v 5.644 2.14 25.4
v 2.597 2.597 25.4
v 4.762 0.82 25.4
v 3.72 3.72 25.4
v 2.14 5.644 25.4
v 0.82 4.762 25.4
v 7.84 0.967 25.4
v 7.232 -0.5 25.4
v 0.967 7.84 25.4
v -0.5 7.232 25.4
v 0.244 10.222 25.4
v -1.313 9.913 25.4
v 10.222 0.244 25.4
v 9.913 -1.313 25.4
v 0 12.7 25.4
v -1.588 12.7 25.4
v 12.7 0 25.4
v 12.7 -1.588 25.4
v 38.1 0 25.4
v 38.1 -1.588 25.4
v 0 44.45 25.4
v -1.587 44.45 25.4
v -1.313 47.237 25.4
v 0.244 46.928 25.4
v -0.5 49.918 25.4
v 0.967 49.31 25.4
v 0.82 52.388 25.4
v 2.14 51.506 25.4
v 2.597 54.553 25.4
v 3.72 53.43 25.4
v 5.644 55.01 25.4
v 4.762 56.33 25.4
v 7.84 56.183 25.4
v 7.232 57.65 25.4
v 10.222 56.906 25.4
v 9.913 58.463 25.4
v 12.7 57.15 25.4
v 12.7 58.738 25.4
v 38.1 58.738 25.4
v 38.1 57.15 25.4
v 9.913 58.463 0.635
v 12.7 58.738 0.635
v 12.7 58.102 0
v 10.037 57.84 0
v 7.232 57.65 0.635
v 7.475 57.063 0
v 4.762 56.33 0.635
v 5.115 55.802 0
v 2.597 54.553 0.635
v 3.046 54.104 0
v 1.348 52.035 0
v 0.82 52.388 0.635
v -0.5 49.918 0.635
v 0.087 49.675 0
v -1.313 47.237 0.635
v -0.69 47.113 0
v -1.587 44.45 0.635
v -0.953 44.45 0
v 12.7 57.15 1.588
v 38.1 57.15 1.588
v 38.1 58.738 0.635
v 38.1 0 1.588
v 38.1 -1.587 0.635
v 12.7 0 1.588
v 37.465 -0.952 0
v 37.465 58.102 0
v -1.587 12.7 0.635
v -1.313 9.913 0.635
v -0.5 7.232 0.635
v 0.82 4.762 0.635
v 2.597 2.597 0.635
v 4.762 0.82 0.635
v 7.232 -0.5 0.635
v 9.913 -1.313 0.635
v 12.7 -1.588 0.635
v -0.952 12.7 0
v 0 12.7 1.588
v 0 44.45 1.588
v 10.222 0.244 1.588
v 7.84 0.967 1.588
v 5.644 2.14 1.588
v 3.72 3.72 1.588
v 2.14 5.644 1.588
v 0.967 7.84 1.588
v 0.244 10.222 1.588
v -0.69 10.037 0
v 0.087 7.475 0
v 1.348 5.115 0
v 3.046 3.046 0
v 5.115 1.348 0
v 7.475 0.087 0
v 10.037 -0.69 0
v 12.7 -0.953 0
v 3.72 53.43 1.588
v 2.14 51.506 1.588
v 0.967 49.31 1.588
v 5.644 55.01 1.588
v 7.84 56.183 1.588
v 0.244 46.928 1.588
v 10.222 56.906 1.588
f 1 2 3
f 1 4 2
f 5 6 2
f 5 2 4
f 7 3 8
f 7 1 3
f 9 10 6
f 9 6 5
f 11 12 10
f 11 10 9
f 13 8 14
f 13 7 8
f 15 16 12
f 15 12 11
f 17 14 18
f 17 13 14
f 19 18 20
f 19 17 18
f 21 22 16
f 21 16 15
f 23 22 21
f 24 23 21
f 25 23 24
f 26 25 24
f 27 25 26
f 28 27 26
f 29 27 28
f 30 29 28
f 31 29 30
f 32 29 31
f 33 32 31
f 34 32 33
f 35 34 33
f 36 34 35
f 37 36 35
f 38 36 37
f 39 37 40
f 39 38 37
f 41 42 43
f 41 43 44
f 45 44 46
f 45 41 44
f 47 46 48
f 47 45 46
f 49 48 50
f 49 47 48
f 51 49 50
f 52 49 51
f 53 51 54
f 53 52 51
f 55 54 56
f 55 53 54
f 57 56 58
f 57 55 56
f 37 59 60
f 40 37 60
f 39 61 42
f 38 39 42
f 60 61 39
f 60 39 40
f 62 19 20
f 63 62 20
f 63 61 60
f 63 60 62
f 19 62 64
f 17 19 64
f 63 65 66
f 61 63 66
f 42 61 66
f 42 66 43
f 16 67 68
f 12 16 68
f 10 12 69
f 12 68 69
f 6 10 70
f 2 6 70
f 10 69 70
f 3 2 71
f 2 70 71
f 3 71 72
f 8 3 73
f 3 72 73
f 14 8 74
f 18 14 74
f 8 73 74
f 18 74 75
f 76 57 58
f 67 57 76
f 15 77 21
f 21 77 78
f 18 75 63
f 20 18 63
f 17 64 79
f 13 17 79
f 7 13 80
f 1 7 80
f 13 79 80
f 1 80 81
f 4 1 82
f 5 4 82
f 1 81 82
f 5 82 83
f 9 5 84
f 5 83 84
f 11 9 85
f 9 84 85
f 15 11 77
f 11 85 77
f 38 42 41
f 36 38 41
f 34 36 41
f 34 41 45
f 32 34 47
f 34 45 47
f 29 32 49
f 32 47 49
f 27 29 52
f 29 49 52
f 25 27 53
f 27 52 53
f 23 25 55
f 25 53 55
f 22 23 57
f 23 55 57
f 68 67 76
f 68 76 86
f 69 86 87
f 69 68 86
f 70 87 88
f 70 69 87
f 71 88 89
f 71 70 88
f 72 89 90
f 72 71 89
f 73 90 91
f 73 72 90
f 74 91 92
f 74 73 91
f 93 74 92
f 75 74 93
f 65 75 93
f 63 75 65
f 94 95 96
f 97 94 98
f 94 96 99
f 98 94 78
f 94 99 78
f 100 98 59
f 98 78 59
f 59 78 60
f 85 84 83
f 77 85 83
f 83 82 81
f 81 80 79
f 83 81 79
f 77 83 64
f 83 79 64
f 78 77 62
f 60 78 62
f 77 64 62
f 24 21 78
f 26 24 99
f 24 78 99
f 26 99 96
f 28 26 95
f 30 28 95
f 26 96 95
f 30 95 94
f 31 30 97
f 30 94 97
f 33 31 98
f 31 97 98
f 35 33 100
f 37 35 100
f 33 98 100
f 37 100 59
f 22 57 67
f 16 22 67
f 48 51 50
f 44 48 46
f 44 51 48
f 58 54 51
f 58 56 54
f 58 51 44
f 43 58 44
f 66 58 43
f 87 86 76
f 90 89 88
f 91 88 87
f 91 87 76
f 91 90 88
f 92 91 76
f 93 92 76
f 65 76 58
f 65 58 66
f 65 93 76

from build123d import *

# Parameters (mm, degrees)
F1_DEPTH = 25.4
F3_DEPTH = 1.5875
F4_SIZE  = 0.635


with BuildPart() as f1:
    # F0 (on Top) → F1 (new body)
    with BuildSketch(Plane.XY):
        with BuildLine():
            Line((38.1, 0), (12.7, 0))
            ThreePointArc((12.7, 0), (3.719744, 3.719744), (0, 12.7))
            Line((0, 12.7), (0, 44.45))
            ThreePointArc((0, 44.45), (3.719744, 53.430256), (12.7, 57.15))
            Line((12.7, 57.15), (38.1, 57.15))
            Line((38.1, 57.15), (38.1, 58.7375))
            Line((38.1, 58.7375), (12.7, 58.7375))
            ThreePointArc((12.7, 58.7375), (2.597212, 54.552788), (-1.5875, 44.45))
            Line((-1.5875, 44.45), (-1.5875, 12.7))
            ThreePointArc((-1.5875, 12.7), (2.597212, 2.597212), (12.7, -1.5875))
            Line((12.7, -1.5875), (38.1, -1.5875))
            Line((38.1, -1.5875), (38.1, 0))
        make_face()
    extrude(amount=F1_DEPTH)

    # F2 (on face) → F3 (join)
    with BuildSketch(Plane(origin=(0, 0, 0), x_dir=(1, 0, 0), z_dir=(0, 0, -1))):
        with BuildLine():
            Line((38.1, 0), (12.7, 0))
            ThreePointArc((12.7, 0), (3.719744, -3.719744), (0, -12.7))
            Line((0, -12.7), (0, -44.45))
            ThreePointArc((0, -44.45), (3.719744, -53.430256), (12.7, -57.15))
            Line((12.7, -57.15), (38.1, -57.15))
            Line((38.1, -57.15), (38.1, 0))
        make_face()
    extrude(amount=-F3_DEPTH)

    # F4
    f4_edges = [f1.edges().sort_by_distance(p)[0] for p in [
        (25.4, -1.5875, 0),
        (38.1, 28.575, 0),
        (25.4, 58.7375, 0),
        (2.597212, 54.552788, 0),
        (-1.5875, 28.575, 0),
        (2.597212, 2.597212, 0),
    ]]
    chamfer(f4_edges, length=F4_SIZE)


solid = f1.part
